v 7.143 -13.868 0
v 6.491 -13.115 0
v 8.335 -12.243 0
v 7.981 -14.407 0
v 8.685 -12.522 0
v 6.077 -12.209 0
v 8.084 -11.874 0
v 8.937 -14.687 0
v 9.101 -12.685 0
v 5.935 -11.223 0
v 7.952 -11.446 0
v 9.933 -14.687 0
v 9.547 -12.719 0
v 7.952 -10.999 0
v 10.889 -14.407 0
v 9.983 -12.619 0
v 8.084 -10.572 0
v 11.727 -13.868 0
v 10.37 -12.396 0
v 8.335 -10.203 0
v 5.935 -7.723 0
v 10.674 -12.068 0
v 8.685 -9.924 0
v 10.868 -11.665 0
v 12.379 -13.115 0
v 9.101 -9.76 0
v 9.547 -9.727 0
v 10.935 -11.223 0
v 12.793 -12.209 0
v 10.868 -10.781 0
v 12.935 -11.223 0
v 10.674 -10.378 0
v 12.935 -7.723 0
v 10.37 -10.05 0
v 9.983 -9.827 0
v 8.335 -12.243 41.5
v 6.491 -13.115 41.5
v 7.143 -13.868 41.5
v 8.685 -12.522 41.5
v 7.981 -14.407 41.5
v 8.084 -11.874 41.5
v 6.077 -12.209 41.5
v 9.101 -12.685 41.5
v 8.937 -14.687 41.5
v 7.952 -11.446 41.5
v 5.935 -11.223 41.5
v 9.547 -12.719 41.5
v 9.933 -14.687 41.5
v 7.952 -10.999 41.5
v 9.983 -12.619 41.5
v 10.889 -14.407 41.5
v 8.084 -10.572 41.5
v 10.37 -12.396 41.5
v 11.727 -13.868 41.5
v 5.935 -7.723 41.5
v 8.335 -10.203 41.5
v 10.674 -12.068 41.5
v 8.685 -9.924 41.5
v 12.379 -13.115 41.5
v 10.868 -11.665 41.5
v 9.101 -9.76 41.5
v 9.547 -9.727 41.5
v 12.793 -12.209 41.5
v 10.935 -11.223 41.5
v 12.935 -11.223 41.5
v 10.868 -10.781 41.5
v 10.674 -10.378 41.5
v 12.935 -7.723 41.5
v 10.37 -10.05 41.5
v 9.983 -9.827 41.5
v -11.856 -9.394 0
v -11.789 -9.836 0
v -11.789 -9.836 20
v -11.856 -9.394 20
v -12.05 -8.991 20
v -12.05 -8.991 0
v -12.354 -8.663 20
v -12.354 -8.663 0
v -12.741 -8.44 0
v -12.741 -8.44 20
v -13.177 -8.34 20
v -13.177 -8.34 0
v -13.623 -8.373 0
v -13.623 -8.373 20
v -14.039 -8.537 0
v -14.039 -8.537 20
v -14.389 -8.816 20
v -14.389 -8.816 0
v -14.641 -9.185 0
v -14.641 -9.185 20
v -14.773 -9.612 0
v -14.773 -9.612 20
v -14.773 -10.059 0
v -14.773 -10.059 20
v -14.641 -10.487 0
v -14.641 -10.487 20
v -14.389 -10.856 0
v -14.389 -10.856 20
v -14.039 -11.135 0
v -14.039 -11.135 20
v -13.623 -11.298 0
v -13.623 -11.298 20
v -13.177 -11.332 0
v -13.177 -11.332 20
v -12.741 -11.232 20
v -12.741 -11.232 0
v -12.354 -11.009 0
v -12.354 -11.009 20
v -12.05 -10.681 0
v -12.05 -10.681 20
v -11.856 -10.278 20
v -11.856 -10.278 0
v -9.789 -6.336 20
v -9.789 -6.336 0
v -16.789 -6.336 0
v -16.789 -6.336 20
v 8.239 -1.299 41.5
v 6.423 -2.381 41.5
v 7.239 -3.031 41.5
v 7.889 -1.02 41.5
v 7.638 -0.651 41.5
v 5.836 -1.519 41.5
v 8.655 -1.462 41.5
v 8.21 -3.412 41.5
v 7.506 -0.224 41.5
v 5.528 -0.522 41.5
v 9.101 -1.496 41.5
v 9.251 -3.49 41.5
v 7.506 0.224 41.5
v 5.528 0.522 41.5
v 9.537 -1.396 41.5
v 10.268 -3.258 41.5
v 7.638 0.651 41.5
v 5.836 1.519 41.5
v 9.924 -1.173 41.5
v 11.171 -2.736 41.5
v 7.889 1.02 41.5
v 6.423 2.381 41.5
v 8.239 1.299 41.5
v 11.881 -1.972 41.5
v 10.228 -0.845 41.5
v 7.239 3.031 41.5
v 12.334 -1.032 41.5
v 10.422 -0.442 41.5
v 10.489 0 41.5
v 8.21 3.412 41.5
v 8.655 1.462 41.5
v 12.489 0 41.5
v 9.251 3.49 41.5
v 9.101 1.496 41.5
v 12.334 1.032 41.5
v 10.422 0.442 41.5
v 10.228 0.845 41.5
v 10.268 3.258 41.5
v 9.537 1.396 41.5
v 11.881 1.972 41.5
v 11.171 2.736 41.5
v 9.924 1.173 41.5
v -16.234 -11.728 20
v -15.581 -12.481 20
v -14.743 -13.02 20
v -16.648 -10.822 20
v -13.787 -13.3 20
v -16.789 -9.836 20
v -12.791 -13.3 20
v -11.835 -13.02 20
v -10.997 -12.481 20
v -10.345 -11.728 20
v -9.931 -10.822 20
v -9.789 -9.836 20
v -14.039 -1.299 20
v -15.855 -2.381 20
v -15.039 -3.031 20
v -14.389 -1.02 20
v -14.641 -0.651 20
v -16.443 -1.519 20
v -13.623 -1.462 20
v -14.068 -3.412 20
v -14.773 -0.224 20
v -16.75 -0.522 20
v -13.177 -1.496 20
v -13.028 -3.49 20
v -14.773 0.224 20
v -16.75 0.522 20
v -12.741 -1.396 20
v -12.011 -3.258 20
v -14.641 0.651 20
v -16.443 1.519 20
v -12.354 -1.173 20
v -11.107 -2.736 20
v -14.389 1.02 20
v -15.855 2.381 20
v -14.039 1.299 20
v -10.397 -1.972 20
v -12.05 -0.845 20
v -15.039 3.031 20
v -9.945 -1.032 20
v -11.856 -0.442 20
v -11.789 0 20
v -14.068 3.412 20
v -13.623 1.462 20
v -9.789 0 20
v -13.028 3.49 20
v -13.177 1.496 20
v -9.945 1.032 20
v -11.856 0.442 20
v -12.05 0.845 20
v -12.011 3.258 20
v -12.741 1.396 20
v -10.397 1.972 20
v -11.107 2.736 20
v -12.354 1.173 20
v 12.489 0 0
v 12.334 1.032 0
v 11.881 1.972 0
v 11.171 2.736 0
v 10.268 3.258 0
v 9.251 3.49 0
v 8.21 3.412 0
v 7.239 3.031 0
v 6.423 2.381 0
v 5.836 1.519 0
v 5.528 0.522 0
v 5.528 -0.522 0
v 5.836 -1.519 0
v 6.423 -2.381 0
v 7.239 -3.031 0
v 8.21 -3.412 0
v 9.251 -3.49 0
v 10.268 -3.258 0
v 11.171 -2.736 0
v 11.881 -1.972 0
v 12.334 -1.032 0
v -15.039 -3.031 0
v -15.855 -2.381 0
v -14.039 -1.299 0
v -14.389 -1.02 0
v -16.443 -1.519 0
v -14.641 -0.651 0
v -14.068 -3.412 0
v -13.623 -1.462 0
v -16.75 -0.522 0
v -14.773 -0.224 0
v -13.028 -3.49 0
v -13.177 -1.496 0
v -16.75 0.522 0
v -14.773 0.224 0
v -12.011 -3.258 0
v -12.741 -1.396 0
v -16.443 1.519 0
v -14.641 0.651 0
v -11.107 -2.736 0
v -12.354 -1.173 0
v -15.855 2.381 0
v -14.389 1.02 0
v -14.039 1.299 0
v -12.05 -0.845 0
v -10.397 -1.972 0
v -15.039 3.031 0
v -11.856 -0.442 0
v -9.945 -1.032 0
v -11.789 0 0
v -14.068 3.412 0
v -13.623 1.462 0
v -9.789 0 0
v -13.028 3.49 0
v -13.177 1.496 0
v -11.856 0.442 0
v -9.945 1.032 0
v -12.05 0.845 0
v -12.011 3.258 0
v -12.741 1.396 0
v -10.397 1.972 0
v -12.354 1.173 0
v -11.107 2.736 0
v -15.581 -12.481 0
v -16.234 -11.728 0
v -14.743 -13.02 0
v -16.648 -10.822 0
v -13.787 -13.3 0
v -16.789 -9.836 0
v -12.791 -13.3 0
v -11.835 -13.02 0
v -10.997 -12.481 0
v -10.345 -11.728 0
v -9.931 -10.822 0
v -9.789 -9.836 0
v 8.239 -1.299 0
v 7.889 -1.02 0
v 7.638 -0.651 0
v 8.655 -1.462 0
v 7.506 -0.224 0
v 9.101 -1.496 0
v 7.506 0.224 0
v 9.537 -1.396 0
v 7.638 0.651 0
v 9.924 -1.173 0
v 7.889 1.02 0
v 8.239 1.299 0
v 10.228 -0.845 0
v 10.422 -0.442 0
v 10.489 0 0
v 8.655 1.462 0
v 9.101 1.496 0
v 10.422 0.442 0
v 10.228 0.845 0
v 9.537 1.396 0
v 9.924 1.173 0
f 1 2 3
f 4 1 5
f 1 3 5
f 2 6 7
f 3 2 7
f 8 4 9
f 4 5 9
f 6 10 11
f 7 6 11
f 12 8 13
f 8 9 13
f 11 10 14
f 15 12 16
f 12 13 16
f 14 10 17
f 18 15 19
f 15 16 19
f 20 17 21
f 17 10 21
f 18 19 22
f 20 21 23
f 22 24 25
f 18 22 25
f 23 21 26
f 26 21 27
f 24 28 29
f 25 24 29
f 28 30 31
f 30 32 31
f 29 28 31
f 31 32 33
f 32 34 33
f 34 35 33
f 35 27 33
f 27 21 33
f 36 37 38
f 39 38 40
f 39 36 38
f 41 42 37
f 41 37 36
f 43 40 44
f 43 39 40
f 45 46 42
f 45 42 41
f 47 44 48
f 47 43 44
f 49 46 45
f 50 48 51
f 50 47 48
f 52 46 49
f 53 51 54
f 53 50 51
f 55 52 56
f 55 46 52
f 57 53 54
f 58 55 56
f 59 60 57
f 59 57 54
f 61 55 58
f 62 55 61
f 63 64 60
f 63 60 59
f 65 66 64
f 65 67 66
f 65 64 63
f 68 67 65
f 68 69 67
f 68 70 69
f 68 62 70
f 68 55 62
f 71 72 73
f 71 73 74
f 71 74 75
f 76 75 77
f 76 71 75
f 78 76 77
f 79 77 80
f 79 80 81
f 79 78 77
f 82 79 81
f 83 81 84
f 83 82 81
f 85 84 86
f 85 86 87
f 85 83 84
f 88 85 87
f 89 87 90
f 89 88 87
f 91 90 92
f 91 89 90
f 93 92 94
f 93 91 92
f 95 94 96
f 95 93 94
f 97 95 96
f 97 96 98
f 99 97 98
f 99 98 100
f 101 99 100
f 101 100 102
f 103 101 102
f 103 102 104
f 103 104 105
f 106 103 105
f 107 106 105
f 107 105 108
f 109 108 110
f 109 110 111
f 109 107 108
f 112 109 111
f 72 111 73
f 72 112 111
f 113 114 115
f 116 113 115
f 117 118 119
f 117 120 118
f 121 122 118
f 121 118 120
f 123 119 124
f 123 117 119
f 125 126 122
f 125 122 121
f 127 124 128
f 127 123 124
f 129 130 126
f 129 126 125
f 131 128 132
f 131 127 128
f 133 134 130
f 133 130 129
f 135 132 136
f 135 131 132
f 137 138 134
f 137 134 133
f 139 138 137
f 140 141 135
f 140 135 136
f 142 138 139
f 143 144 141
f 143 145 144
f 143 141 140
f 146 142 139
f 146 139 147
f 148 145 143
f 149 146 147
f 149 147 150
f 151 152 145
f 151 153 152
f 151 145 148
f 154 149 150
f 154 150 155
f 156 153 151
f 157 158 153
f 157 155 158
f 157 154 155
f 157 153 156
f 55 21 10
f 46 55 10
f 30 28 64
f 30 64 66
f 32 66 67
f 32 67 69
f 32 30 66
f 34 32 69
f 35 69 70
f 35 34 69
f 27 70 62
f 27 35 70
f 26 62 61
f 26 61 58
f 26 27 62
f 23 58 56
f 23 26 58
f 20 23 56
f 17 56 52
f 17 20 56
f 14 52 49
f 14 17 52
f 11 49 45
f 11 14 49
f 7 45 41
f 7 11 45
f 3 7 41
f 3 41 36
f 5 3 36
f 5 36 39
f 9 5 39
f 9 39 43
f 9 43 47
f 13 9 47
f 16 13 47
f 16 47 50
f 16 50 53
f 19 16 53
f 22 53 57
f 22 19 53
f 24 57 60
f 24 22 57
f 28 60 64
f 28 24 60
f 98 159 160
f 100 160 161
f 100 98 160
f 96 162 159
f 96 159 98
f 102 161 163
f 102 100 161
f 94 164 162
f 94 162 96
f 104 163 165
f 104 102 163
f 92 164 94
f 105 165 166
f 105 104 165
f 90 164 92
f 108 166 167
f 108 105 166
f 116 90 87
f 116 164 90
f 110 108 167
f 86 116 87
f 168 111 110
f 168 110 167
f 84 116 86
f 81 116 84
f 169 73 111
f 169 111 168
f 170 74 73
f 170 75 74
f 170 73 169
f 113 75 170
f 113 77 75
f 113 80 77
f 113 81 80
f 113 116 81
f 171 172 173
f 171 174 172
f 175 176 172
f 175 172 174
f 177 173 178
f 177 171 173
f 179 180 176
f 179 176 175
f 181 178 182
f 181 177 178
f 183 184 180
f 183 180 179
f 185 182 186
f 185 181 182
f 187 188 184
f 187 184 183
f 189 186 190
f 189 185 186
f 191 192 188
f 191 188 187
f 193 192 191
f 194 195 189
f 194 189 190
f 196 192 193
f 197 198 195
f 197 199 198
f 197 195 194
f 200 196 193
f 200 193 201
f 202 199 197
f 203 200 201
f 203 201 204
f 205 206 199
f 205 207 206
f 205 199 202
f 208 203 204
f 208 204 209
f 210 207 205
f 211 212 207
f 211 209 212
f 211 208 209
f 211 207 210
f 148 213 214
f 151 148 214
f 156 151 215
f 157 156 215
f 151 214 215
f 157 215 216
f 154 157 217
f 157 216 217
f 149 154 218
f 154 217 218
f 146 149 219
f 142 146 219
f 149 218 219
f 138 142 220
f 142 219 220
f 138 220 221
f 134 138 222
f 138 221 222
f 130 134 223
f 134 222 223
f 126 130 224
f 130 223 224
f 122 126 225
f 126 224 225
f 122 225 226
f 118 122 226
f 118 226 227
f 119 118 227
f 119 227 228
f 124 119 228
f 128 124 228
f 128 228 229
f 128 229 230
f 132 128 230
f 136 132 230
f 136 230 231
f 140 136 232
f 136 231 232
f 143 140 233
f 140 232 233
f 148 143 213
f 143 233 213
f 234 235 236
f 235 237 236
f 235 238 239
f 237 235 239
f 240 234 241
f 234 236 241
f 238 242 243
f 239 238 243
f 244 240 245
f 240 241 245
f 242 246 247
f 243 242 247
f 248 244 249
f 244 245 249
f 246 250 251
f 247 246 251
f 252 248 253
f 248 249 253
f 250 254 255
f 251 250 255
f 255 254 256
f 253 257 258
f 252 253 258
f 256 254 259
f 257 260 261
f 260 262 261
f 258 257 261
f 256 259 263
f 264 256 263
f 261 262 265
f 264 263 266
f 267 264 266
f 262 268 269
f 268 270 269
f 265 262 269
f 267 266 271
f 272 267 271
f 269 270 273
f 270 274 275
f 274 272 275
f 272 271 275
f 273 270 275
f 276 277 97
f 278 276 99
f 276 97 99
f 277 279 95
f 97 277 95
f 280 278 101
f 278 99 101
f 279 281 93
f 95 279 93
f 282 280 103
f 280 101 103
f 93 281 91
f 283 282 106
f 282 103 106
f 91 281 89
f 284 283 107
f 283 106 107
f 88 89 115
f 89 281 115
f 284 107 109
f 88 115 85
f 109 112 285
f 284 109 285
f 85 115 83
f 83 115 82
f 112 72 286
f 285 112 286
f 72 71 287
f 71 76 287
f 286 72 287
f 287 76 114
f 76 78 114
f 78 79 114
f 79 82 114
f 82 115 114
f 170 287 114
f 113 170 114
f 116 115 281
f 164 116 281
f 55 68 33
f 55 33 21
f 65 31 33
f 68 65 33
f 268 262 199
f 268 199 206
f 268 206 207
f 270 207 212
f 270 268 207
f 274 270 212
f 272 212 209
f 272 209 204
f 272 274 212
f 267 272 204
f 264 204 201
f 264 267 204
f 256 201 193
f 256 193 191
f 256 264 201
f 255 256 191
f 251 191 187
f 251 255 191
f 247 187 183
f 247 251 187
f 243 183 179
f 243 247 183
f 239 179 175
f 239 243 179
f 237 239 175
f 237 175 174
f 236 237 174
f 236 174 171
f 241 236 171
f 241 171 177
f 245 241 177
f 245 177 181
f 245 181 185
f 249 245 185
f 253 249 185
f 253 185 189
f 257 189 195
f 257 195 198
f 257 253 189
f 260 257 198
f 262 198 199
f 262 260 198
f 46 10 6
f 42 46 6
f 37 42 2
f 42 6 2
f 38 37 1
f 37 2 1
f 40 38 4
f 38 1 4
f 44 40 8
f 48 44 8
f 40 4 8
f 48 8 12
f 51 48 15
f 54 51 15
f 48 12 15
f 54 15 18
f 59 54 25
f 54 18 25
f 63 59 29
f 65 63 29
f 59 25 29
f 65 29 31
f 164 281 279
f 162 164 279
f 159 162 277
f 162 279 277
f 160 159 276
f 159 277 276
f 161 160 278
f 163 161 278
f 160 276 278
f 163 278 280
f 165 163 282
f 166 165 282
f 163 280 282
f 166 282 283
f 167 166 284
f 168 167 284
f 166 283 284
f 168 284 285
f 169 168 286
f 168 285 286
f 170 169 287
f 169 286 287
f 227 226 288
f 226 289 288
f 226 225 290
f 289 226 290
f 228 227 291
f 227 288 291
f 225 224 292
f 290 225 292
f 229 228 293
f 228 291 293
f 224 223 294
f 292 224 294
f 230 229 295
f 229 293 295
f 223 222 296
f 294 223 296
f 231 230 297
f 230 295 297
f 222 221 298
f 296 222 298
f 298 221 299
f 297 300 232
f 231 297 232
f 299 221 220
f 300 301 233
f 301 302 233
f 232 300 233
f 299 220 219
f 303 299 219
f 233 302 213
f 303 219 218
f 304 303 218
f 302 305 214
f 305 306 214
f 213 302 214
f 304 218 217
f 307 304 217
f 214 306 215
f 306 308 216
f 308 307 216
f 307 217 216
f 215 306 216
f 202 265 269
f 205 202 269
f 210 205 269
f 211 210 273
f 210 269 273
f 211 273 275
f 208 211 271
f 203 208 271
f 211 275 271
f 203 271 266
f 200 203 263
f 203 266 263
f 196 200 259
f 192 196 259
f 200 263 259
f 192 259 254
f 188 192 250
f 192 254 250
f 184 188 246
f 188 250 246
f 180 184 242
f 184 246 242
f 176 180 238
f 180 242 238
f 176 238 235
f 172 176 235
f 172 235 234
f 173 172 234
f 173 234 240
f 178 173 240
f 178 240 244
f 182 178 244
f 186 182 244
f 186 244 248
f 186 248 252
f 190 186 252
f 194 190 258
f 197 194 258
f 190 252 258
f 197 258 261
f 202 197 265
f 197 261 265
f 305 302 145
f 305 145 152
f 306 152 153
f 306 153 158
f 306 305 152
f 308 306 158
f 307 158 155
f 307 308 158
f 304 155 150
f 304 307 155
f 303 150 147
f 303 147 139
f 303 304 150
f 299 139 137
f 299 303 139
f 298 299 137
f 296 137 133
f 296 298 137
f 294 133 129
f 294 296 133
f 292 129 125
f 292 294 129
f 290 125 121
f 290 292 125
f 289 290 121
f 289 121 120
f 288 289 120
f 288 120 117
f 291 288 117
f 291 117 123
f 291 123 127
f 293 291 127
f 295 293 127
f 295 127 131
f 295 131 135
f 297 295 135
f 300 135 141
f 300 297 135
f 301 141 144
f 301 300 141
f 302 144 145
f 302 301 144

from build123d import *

# Parameters (mm, degrees)
F0_R     = 3.5
F0_R_2   = 1.5
F1_DEPTH = 20
F2_R     = 3.5
F2_R_2   = 1.5
F3_DEPTH = 41.5


with BuildPart() as f1:
    # F0 (on Top) → F1 (new body)
    with BuildSketch(Plane.XY):
        with Locations((-13.289317, 0)):
            Circle(F0_R)
        with Locations((-13.289317, 0)):
            Circle(F0_R_2, mode=Mode.SUBTRACT)
        with BuildLine():
            Line((-9.789317, -6.335843), (-16.789317, -6.335843))
            Line((-16.789317, -6.335843), (-16.789317, -9.835843))
            ThreePointArc((-16.789317, -9.835843), (-13.289317, -13.335843), (-9.789317, -9.835843))
            Line((-9.789317, -9.835843), (-9.789317, -6.335843))
        make_face()
        with Locations((-13.289317, -9.835843)):
            Circle(F0_R_2, mode=Mode.SUBTRACT)
    extrude(amount=F1_DEPTH)


with BuildPart() as f3:
    # F2 (on Top) → F3 (new body)
    with BuildSketch(Plane.XY):
        with Locations((8.989015, 0)):
            Circle(F2_R)
        with Locations((8.989015, 0)):
            Circle(F2_R_2, mode=Mode.SUBTRACT)
        with BuildLine():
            Line((12.935055, -7.722865), (5.935055, -7.722865))
            Line((5.935055, -7.722865), (5.935055, -11.222865))
            ThreePointArc((5.935055, -11.222865), (9.435055, -14.722865), (12.935055, -11.222865))
            Line((12.935055, -11.222865), (12.935055, -7.722865))
        make_face()
        with Locations((9.435055, -11.222865)):
            Circle(F2_R_2, mode=Mode.SUBTRACT)
    extrude(amount=F3_DEPTH)


solid = Compound([f1.part, f3.part])
